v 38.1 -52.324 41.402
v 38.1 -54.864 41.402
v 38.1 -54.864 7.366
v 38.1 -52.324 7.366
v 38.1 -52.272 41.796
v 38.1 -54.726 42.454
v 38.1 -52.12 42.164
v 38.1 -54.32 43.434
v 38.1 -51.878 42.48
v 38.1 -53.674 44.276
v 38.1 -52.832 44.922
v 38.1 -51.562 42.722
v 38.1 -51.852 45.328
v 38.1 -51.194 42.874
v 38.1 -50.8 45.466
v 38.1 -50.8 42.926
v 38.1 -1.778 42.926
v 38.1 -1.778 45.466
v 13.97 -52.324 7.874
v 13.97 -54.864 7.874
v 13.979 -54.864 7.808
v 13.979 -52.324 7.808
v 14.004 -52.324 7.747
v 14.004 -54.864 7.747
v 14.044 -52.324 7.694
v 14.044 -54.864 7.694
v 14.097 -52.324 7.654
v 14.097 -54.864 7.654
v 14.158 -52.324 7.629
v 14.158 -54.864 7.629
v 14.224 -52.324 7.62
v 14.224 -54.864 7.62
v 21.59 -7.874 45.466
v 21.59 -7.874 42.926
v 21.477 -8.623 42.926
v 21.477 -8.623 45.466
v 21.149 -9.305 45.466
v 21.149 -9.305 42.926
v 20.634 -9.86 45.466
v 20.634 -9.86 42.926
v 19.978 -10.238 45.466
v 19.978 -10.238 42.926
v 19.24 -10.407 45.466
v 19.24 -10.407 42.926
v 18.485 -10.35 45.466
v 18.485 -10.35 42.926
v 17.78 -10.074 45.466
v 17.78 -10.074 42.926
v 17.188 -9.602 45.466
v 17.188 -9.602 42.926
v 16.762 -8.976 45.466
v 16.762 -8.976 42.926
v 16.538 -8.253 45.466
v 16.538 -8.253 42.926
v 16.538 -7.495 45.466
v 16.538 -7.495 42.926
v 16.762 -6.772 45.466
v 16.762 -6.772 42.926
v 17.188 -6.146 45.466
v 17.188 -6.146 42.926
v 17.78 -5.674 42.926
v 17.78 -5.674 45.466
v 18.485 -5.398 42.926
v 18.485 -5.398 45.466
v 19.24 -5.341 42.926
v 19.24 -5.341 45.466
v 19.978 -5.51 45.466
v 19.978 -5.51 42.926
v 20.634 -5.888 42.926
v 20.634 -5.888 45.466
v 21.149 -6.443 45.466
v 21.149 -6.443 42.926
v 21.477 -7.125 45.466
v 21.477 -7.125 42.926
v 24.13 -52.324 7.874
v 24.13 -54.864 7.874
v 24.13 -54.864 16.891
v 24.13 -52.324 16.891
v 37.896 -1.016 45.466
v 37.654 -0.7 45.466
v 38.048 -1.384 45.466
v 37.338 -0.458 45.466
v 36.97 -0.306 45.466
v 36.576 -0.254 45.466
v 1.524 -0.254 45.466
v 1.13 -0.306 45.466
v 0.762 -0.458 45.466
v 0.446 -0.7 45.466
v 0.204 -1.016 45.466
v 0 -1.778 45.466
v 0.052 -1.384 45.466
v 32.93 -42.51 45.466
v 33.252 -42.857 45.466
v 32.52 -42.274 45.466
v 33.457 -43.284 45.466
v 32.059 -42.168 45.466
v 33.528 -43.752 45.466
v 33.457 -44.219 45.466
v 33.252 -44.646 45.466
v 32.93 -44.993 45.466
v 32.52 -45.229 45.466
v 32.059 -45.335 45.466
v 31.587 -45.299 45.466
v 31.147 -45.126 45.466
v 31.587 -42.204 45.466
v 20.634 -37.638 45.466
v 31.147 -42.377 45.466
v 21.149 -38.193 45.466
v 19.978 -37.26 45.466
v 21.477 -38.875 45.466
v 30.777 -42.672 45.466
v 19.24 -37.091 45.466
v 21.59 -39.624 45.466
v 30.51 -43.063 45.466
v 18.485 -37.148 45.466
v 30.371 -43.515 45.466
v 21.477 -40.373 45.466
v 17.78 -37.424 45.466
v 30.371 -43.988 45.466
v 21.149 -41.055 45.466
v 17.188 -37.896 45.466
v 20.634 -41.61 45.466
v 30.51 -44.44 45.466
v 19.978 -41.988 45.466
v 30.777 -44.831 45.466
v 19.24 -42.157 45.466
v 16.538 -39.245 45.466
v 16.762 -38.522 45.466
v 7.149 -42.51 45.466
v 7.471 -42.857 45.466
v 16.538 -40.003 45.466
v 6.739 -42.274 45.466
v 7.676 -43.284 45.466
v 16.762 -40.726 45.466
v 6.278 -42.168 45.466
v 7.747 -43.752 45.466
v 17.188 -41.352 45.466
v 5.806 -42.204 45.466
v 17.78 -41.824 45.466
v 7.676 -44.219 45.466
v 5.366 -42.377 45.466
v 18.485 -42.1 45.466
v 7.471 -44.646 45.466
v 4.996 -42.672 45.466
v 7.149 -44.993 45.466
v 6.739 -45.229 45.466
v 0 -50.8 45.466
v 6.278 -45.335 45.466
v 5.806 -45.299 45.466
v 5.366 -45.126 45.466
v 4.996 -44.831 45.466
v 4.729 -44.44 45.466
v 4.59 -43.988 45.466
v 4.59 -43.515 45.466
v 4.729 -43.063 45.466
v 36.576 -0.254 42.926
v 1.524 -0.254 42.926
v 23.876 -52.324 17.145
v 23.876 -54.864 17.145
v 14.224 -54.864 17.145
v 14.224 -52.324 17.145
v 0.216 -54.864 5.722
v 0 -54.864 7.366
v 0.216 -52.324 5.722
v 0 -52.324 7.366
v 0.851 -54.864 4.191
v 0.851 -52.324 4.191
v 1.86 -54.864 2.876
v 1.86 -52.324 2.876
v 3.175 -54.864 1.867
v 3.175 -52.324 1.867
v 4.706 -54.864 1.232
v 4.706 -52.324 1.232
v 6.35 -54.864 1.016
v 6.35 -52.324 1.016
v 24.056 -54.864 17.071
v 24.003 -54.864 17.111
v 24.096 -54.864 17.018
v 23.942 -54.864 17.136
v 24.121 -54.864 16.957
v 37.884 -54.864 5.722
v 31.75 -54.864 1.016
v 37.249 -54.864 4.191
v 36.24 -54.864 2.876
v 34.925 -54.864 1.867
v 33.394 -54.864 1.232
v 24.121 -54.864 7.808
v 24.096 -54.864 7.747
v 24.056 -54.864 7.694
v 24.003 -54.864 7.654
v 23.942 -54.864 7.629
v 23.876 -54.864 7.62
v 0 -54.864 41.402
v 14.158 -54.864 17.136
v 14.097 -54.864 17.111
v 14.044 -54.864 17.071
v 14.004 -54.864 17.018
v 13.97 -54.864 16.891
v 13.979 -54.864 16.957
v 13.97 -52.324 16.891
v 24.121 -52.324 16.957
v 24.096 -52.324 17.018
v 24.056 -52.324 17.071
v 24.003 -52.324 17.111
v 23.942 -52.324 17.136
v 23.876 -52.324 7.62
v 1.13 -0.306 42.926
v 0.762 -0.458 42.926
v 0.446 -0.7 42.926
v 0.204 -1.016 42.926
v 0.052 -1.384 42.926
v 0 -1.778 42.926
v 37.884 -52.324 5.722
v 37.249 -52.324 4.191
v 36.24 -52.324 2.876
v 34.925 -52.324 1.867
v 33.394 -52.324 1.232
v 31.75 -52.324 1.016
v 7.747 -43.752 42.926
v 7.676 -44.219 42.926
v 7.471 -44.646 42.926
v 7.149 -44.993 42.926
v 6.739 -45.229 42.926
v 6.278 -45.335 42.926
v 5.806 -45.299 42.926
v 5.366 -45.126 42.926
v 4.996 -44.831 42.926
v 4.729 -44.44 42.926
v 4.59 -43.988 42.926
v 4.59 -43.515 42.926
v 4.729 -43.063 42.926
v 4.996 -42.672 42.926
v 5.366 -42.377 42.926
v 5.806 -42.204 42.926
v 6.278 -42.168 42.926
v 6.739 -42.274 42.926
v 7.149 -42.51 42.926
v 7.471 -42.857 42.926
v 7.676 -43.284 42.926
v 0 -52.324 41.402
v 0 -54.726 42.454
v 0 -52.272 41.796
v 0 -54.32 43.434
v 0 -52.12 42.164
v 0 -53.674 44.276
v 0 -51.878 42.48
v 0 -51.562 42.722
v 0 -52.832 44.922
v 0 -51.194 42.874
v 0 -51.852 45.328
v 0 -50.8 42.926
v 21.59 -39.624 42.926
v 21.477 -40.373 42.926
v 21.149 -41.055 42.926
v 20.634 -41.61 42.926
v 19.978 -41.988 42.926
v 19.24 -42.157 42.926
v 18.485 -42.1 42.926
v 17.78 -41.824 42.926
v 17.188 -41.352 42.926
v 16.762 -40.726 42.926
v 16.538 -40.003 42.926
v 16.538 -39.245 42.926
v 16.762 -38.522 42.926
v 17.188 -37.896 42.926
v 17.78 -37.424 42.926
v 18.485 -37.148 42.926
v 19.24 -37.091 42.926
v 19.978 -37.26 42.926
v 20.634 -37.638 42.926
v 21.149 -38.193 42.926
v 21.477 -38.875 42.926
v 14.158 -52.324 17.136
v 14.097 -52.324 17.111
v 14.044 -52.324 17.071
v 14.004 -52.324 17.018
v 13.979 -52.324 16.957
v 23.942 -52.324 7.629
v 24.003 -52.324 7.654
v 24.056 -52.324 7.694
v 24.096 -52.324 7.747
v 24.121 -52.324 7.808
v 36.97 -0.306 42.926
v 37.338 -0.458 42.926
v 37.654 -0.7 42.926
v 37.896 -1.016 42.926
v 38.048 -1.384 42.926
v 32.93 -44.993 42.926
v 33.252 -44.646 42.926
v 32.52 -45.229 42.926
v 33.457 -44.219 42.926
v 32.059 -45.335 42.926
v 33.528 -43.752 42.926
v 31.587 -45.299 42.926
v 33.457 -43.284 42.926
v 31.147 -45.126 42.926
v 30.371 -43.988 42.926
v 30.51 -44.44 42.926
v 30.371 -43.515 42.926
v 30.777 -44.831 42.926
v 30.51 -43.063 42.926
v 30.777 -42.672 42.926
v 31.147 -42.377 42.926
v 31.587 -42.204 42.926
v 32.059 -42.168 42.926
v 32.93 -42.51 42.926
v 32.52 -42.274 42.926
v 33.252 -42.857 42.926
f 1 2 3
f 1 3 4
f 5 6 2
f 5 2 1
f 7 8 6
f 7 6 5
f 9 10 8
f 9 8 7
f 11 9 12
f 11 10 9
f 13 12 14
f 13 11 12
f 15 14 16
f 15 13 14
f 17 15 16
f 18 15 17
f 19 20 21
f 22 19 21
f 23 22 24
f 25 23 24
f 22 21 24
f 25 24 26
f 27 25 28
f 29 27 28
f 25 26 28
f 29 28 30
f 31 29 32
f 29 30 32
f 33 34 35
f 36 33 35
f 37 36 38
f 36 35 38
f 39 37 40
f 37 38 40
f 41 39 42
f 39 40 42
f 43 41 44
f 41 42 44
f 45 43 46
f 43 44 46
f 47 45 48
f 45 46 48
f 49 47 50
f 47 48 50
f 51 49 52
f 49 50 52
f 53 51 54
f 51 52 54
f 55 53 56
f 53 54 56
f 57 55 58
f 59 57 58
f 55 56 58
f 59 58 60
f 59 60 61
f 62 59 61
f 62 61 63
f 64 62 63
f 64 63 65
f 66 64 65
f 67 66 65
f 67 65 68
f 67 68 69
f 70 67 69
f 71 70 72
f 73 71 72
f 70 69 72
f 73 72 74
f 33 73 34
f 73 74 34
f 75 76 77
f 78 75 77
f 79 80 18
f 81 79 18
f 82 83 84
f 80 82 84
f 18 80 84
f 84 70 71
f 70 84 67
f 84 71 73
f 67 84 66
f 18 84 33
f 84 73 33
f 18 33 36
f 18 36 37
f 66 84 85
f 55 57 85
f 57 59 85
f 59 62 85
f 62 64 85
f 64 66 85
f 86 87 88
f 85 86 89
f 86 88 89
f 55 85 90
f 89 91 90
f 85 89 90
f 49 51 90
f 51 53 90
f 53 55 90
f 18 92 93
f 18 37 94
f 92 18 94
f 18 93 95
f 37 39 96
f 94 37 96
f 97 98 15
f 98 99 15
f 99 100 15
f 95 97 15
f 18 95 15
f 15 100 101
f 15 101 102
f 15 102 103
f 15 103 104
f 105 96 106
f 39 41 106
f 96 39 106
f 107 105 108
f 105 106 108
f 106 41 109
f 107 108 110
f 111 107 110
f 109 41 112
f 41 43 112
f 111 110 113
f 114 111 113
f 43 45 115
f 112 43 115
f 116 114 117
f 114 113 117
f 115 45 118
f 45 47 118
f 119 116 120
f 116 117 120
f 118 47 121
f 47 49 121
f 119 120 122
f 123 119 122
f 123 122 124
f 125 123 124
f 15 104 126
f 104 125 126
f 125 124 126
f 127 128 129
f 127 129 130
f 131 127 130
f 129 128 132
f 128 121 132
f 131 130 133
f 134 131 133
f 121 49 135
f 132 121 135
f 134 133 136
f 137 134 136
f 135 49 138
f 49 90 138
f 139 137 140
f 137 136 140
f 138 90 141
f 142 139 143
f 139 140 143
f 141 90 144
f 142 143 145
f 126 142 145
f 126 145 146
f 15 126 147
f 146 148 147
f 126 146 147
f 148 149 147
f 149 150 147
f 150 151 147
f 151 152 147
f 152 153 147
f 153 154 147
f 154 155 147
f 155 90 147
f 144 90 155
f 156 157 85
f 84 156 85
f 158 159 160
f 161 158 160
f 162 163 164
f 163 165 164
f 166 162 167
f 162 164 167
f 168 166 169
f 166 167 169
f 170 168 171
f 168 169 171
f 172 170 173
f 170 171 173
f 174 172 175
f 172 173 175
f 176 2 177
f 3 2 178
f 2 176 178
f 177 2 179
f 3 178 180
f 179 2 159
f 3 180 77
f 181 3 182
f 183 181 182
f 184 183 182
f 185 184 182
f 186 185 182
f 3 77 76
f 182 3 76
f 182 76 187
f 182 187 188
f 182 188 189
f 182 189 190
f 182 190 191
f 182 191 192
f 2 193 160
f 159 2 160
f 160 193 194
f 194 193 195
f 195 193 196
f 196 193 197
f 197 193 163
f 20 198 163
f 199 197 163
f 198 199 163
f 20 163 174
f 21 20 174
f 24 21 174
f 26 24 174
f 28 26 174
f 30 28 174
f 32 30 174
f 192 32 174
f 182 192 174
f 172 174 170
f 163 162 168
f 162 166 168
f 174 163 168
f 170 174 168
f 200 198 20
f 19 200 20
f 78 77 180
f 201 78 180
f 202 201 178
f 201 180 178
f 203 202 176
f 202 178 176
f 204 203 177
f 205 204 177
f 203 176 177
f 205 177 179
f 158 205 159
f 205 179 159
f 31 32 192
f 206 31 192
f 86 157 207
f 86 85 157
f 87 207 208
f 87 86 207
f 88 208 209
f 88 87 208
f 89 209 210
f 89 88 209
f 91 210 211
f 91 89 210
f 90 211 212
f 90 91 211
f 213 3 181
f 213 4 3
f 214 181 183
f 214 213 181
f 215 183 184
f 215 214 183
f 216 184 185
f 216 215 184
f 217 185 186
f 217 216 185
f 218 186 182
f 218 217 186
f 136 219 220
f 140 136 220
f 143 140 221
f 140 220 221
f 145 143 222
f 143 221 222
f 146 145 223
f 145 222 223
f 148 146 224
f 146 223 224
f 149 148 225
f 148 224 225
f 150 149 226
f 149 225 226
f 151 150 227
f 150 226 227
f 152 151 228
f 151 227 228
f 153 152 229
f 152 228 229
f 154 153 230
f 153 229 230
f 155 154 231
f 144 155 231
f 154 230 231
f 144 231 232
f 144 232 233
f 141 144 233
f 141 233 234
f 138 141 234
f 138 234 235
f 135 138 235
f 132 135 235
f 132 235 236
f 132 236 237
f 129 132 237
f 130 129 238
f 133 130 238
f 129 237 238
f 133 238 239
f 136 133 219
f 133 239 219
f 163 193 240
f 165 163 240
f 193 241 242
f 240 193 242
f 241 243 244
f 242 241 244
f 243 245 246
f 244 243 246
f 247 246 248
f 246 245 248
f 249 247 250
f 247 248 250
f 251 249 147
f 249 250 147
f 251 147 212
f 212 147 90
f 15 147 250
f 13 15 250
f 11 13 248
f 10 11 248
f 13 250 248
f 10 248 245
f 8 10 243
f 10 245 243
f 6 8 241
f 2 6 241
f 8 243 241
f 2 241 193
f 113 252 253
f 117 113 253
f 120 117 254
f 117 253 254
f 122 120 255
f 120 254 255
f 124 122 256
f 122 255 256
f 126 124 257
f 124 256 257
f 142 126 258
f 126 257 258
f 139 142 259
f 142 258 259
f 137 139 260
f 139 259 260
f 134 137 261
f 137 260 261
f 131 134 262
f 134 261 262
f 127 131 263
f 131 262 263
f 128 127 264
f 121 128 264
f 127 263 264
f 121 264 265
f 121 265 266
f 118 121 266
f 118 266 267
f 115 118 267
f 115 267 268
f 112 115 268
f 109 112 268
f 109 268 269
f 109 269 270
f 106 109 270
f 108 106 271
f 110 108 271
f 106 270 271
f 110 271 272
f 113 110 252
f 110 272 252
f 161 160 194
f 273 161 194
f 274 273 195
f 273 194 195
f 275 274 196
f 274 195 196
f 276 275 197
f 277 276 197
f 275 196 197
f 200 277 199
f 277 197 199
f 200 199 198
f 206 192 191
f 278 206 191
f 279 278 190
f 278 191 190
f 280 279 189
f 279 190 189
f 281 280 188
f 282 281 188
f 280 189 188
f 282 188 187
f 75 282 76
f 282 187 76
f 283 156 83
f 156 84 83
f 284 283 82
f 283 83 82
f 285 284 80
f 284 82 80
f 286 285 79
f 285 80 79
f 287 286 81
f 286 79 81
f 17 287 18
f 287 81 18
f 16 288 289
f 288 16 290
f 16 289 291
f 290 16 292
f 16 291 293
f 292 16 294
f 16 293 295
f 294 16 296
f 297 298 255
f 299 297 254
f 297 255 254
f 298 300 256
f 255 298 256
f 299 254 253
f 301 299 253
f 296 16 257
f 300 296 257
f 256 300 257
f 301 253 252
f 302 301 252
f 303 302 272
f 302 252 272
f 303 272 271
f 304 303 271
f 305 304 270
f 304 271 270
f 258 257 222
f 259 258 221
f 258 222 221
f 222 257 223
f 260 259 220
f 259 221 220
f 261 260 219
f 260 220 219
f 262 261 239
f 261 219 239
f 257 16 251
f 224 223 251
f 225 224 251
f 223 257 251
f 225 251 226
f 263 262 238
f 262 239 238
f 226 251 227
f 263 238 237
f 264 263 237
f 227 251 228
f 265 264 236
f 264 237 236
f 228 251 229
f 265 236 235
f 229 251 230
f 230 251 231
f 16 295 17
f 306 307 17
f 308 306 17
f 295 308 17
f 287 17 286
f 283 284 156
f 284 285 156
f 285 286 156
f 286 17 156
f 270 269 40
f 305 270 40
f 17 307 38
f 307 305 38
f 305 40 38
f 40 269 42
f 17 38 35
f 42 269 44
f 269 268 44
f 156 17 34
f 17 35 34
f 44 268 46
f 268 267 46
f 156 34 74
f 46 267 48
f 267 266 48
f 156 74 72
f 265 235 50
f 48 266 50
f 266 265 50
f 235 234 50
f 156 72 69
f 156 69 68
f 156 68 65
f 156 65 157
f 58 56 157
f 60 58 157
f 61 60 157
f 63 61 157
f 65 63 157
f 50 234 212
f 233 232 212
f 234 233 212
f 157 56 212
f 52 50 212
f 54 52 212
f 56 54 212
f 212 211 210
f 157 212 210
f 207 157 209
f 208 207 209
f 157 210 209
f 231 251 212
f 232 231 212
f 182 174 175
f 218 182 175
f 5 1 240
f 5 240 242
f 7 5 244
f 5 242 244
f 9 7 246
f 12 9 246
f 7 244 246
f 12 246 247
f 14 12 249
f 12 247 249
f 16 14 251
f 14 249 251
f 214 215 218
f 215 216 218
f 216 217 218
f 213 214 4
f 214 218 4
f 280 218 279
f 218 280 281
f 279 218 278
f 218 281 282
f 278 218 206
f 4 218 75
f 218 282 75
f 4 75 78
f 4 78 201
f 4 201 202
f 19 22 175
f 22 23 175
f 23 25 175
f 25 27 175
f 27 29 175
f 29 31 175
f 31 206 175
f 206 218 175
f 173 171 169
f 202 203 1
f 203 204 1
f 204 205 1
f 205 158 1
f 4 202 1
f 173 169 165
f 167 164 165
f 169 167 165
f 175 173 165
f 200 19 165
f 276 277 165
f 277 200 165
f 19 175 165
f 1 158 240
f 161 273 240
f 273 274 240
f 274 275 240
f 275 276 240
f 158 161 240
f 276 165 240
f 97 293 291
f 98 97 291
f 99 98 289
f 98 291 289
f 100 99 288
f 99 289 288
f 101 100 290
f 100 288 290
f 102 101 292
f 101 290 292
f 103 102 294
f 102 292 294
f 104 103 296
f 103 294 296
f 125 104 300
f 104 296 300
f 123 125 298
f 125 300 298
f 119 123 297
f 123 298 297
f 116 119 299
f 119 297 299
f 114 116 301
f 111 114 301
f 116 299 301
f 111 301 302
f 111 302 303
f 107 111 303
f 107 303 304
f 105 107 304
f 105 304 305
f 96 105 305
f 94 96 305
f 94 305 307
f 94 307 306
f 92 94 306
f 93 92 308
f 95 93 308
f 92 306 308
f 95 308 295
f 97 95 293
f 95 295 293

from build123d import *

# Parameters (mm, degrees)
F1_DEPTH = 38.1
F2_R     = 1.524
F3_R     = 1.5875
F3_R_2   = 2.54
F4_DEPTH = 2.54
F6_DEPTH = 2.54
F7_R     = 6.35


with BuildPart() as f1:
    # F0 (on Right) → F1 (new body)
    with BuildSketch(Plane.YZ):
        with BuildLine():
            Line((-54.864, 1.016), (-52.324, 1.016))
            Line((-52.324, 1.016), (-52.324, 41.402))
            ThreePointArc((-52.324, 41.402), (-51.877631, 42.479631), (-50.8, 42.926))
            Line((-50.8, 42.926), (-0.254, 42.926))
            Line((-0.254, 42.926), (-0.254, 45.466))
            Line((-0.254, 45.466), (-50.8, 45.466))
            ThreePointArc((-50.8, 45.466), (-53.673682, 44.275682), (-54.864, 41.402))
            Line((-54.864, 41.402), (-54.864, 1.016))
        make_face()
    extrude(amount=F1_DEPTH)

    # F2
    f2_edges = [f1.edges().sort_by_distance(p)[0] for p in [
        (0, -0.254, 44.196),
        (38.1, -0.254, 44.196),
    ]]
    fillet(f2_edges, radius=F2_R)

    # F3 (on face) → F4 (cut, through all)
    with BuildSketch(Plane(origin=(0, 0, 42.926), x_dir=(1, 0, 0), z_dir=(0, 0, -1))):
        with Locations((6.1595, 43.7515)):
            Circle(F3_R)
        with Locations((19.05, 39.624)):
            Circle(F3_R_2)
        with Locations((31.9405, 43.7515)):
            Circle(F3_R)
        with Locations((19.05, 7.874)):
            Circle(F3_R_2)
    extrude(amount=-F4_DEPTH, mode=Mode.SUBTRACT)

    # F5 (on face) → F6 (cut, through all)
    with BuildSketch(Plane.XZ.offset(54.864)):
        with BuildLine():
            ThreePointArc((13.97, 7.874), (14.044395, 7.694395), (14.224, 7.62))
            Line((14.224, 7.62), (23.876, 7.62))
            ThreePointArc((23.876, 7.62), (24.055605, 7.694395), (24.13, 7.874))
            Line((24.13, 7.874), (24.13, 16.891))
            ThreePointArc((24.13, 16.891), (24.055605, 17.070605), (23.876, 17.145))
            Line((23.876, 17.145), (14.224, 17.145))
            ThreePointArc((14.224, 17.145), (14.044395, 17.070605), (13.97, 16.891))
            Line((13.97, 16.891), (13.97, 7.874))
        make_face()
    extrude(amount=-F6_DEPTH, mode=Mode.SUBTRACT)

    # F7
    f7_edges = [f1.edges().sort_by_distance(p)[0] for p in [
        (38.1, -53.594, 1.016),
        (0, -53.594, 1.016),
    ]]
    fillet(f7_edges, radius=F7_R)


solid = f1.part
